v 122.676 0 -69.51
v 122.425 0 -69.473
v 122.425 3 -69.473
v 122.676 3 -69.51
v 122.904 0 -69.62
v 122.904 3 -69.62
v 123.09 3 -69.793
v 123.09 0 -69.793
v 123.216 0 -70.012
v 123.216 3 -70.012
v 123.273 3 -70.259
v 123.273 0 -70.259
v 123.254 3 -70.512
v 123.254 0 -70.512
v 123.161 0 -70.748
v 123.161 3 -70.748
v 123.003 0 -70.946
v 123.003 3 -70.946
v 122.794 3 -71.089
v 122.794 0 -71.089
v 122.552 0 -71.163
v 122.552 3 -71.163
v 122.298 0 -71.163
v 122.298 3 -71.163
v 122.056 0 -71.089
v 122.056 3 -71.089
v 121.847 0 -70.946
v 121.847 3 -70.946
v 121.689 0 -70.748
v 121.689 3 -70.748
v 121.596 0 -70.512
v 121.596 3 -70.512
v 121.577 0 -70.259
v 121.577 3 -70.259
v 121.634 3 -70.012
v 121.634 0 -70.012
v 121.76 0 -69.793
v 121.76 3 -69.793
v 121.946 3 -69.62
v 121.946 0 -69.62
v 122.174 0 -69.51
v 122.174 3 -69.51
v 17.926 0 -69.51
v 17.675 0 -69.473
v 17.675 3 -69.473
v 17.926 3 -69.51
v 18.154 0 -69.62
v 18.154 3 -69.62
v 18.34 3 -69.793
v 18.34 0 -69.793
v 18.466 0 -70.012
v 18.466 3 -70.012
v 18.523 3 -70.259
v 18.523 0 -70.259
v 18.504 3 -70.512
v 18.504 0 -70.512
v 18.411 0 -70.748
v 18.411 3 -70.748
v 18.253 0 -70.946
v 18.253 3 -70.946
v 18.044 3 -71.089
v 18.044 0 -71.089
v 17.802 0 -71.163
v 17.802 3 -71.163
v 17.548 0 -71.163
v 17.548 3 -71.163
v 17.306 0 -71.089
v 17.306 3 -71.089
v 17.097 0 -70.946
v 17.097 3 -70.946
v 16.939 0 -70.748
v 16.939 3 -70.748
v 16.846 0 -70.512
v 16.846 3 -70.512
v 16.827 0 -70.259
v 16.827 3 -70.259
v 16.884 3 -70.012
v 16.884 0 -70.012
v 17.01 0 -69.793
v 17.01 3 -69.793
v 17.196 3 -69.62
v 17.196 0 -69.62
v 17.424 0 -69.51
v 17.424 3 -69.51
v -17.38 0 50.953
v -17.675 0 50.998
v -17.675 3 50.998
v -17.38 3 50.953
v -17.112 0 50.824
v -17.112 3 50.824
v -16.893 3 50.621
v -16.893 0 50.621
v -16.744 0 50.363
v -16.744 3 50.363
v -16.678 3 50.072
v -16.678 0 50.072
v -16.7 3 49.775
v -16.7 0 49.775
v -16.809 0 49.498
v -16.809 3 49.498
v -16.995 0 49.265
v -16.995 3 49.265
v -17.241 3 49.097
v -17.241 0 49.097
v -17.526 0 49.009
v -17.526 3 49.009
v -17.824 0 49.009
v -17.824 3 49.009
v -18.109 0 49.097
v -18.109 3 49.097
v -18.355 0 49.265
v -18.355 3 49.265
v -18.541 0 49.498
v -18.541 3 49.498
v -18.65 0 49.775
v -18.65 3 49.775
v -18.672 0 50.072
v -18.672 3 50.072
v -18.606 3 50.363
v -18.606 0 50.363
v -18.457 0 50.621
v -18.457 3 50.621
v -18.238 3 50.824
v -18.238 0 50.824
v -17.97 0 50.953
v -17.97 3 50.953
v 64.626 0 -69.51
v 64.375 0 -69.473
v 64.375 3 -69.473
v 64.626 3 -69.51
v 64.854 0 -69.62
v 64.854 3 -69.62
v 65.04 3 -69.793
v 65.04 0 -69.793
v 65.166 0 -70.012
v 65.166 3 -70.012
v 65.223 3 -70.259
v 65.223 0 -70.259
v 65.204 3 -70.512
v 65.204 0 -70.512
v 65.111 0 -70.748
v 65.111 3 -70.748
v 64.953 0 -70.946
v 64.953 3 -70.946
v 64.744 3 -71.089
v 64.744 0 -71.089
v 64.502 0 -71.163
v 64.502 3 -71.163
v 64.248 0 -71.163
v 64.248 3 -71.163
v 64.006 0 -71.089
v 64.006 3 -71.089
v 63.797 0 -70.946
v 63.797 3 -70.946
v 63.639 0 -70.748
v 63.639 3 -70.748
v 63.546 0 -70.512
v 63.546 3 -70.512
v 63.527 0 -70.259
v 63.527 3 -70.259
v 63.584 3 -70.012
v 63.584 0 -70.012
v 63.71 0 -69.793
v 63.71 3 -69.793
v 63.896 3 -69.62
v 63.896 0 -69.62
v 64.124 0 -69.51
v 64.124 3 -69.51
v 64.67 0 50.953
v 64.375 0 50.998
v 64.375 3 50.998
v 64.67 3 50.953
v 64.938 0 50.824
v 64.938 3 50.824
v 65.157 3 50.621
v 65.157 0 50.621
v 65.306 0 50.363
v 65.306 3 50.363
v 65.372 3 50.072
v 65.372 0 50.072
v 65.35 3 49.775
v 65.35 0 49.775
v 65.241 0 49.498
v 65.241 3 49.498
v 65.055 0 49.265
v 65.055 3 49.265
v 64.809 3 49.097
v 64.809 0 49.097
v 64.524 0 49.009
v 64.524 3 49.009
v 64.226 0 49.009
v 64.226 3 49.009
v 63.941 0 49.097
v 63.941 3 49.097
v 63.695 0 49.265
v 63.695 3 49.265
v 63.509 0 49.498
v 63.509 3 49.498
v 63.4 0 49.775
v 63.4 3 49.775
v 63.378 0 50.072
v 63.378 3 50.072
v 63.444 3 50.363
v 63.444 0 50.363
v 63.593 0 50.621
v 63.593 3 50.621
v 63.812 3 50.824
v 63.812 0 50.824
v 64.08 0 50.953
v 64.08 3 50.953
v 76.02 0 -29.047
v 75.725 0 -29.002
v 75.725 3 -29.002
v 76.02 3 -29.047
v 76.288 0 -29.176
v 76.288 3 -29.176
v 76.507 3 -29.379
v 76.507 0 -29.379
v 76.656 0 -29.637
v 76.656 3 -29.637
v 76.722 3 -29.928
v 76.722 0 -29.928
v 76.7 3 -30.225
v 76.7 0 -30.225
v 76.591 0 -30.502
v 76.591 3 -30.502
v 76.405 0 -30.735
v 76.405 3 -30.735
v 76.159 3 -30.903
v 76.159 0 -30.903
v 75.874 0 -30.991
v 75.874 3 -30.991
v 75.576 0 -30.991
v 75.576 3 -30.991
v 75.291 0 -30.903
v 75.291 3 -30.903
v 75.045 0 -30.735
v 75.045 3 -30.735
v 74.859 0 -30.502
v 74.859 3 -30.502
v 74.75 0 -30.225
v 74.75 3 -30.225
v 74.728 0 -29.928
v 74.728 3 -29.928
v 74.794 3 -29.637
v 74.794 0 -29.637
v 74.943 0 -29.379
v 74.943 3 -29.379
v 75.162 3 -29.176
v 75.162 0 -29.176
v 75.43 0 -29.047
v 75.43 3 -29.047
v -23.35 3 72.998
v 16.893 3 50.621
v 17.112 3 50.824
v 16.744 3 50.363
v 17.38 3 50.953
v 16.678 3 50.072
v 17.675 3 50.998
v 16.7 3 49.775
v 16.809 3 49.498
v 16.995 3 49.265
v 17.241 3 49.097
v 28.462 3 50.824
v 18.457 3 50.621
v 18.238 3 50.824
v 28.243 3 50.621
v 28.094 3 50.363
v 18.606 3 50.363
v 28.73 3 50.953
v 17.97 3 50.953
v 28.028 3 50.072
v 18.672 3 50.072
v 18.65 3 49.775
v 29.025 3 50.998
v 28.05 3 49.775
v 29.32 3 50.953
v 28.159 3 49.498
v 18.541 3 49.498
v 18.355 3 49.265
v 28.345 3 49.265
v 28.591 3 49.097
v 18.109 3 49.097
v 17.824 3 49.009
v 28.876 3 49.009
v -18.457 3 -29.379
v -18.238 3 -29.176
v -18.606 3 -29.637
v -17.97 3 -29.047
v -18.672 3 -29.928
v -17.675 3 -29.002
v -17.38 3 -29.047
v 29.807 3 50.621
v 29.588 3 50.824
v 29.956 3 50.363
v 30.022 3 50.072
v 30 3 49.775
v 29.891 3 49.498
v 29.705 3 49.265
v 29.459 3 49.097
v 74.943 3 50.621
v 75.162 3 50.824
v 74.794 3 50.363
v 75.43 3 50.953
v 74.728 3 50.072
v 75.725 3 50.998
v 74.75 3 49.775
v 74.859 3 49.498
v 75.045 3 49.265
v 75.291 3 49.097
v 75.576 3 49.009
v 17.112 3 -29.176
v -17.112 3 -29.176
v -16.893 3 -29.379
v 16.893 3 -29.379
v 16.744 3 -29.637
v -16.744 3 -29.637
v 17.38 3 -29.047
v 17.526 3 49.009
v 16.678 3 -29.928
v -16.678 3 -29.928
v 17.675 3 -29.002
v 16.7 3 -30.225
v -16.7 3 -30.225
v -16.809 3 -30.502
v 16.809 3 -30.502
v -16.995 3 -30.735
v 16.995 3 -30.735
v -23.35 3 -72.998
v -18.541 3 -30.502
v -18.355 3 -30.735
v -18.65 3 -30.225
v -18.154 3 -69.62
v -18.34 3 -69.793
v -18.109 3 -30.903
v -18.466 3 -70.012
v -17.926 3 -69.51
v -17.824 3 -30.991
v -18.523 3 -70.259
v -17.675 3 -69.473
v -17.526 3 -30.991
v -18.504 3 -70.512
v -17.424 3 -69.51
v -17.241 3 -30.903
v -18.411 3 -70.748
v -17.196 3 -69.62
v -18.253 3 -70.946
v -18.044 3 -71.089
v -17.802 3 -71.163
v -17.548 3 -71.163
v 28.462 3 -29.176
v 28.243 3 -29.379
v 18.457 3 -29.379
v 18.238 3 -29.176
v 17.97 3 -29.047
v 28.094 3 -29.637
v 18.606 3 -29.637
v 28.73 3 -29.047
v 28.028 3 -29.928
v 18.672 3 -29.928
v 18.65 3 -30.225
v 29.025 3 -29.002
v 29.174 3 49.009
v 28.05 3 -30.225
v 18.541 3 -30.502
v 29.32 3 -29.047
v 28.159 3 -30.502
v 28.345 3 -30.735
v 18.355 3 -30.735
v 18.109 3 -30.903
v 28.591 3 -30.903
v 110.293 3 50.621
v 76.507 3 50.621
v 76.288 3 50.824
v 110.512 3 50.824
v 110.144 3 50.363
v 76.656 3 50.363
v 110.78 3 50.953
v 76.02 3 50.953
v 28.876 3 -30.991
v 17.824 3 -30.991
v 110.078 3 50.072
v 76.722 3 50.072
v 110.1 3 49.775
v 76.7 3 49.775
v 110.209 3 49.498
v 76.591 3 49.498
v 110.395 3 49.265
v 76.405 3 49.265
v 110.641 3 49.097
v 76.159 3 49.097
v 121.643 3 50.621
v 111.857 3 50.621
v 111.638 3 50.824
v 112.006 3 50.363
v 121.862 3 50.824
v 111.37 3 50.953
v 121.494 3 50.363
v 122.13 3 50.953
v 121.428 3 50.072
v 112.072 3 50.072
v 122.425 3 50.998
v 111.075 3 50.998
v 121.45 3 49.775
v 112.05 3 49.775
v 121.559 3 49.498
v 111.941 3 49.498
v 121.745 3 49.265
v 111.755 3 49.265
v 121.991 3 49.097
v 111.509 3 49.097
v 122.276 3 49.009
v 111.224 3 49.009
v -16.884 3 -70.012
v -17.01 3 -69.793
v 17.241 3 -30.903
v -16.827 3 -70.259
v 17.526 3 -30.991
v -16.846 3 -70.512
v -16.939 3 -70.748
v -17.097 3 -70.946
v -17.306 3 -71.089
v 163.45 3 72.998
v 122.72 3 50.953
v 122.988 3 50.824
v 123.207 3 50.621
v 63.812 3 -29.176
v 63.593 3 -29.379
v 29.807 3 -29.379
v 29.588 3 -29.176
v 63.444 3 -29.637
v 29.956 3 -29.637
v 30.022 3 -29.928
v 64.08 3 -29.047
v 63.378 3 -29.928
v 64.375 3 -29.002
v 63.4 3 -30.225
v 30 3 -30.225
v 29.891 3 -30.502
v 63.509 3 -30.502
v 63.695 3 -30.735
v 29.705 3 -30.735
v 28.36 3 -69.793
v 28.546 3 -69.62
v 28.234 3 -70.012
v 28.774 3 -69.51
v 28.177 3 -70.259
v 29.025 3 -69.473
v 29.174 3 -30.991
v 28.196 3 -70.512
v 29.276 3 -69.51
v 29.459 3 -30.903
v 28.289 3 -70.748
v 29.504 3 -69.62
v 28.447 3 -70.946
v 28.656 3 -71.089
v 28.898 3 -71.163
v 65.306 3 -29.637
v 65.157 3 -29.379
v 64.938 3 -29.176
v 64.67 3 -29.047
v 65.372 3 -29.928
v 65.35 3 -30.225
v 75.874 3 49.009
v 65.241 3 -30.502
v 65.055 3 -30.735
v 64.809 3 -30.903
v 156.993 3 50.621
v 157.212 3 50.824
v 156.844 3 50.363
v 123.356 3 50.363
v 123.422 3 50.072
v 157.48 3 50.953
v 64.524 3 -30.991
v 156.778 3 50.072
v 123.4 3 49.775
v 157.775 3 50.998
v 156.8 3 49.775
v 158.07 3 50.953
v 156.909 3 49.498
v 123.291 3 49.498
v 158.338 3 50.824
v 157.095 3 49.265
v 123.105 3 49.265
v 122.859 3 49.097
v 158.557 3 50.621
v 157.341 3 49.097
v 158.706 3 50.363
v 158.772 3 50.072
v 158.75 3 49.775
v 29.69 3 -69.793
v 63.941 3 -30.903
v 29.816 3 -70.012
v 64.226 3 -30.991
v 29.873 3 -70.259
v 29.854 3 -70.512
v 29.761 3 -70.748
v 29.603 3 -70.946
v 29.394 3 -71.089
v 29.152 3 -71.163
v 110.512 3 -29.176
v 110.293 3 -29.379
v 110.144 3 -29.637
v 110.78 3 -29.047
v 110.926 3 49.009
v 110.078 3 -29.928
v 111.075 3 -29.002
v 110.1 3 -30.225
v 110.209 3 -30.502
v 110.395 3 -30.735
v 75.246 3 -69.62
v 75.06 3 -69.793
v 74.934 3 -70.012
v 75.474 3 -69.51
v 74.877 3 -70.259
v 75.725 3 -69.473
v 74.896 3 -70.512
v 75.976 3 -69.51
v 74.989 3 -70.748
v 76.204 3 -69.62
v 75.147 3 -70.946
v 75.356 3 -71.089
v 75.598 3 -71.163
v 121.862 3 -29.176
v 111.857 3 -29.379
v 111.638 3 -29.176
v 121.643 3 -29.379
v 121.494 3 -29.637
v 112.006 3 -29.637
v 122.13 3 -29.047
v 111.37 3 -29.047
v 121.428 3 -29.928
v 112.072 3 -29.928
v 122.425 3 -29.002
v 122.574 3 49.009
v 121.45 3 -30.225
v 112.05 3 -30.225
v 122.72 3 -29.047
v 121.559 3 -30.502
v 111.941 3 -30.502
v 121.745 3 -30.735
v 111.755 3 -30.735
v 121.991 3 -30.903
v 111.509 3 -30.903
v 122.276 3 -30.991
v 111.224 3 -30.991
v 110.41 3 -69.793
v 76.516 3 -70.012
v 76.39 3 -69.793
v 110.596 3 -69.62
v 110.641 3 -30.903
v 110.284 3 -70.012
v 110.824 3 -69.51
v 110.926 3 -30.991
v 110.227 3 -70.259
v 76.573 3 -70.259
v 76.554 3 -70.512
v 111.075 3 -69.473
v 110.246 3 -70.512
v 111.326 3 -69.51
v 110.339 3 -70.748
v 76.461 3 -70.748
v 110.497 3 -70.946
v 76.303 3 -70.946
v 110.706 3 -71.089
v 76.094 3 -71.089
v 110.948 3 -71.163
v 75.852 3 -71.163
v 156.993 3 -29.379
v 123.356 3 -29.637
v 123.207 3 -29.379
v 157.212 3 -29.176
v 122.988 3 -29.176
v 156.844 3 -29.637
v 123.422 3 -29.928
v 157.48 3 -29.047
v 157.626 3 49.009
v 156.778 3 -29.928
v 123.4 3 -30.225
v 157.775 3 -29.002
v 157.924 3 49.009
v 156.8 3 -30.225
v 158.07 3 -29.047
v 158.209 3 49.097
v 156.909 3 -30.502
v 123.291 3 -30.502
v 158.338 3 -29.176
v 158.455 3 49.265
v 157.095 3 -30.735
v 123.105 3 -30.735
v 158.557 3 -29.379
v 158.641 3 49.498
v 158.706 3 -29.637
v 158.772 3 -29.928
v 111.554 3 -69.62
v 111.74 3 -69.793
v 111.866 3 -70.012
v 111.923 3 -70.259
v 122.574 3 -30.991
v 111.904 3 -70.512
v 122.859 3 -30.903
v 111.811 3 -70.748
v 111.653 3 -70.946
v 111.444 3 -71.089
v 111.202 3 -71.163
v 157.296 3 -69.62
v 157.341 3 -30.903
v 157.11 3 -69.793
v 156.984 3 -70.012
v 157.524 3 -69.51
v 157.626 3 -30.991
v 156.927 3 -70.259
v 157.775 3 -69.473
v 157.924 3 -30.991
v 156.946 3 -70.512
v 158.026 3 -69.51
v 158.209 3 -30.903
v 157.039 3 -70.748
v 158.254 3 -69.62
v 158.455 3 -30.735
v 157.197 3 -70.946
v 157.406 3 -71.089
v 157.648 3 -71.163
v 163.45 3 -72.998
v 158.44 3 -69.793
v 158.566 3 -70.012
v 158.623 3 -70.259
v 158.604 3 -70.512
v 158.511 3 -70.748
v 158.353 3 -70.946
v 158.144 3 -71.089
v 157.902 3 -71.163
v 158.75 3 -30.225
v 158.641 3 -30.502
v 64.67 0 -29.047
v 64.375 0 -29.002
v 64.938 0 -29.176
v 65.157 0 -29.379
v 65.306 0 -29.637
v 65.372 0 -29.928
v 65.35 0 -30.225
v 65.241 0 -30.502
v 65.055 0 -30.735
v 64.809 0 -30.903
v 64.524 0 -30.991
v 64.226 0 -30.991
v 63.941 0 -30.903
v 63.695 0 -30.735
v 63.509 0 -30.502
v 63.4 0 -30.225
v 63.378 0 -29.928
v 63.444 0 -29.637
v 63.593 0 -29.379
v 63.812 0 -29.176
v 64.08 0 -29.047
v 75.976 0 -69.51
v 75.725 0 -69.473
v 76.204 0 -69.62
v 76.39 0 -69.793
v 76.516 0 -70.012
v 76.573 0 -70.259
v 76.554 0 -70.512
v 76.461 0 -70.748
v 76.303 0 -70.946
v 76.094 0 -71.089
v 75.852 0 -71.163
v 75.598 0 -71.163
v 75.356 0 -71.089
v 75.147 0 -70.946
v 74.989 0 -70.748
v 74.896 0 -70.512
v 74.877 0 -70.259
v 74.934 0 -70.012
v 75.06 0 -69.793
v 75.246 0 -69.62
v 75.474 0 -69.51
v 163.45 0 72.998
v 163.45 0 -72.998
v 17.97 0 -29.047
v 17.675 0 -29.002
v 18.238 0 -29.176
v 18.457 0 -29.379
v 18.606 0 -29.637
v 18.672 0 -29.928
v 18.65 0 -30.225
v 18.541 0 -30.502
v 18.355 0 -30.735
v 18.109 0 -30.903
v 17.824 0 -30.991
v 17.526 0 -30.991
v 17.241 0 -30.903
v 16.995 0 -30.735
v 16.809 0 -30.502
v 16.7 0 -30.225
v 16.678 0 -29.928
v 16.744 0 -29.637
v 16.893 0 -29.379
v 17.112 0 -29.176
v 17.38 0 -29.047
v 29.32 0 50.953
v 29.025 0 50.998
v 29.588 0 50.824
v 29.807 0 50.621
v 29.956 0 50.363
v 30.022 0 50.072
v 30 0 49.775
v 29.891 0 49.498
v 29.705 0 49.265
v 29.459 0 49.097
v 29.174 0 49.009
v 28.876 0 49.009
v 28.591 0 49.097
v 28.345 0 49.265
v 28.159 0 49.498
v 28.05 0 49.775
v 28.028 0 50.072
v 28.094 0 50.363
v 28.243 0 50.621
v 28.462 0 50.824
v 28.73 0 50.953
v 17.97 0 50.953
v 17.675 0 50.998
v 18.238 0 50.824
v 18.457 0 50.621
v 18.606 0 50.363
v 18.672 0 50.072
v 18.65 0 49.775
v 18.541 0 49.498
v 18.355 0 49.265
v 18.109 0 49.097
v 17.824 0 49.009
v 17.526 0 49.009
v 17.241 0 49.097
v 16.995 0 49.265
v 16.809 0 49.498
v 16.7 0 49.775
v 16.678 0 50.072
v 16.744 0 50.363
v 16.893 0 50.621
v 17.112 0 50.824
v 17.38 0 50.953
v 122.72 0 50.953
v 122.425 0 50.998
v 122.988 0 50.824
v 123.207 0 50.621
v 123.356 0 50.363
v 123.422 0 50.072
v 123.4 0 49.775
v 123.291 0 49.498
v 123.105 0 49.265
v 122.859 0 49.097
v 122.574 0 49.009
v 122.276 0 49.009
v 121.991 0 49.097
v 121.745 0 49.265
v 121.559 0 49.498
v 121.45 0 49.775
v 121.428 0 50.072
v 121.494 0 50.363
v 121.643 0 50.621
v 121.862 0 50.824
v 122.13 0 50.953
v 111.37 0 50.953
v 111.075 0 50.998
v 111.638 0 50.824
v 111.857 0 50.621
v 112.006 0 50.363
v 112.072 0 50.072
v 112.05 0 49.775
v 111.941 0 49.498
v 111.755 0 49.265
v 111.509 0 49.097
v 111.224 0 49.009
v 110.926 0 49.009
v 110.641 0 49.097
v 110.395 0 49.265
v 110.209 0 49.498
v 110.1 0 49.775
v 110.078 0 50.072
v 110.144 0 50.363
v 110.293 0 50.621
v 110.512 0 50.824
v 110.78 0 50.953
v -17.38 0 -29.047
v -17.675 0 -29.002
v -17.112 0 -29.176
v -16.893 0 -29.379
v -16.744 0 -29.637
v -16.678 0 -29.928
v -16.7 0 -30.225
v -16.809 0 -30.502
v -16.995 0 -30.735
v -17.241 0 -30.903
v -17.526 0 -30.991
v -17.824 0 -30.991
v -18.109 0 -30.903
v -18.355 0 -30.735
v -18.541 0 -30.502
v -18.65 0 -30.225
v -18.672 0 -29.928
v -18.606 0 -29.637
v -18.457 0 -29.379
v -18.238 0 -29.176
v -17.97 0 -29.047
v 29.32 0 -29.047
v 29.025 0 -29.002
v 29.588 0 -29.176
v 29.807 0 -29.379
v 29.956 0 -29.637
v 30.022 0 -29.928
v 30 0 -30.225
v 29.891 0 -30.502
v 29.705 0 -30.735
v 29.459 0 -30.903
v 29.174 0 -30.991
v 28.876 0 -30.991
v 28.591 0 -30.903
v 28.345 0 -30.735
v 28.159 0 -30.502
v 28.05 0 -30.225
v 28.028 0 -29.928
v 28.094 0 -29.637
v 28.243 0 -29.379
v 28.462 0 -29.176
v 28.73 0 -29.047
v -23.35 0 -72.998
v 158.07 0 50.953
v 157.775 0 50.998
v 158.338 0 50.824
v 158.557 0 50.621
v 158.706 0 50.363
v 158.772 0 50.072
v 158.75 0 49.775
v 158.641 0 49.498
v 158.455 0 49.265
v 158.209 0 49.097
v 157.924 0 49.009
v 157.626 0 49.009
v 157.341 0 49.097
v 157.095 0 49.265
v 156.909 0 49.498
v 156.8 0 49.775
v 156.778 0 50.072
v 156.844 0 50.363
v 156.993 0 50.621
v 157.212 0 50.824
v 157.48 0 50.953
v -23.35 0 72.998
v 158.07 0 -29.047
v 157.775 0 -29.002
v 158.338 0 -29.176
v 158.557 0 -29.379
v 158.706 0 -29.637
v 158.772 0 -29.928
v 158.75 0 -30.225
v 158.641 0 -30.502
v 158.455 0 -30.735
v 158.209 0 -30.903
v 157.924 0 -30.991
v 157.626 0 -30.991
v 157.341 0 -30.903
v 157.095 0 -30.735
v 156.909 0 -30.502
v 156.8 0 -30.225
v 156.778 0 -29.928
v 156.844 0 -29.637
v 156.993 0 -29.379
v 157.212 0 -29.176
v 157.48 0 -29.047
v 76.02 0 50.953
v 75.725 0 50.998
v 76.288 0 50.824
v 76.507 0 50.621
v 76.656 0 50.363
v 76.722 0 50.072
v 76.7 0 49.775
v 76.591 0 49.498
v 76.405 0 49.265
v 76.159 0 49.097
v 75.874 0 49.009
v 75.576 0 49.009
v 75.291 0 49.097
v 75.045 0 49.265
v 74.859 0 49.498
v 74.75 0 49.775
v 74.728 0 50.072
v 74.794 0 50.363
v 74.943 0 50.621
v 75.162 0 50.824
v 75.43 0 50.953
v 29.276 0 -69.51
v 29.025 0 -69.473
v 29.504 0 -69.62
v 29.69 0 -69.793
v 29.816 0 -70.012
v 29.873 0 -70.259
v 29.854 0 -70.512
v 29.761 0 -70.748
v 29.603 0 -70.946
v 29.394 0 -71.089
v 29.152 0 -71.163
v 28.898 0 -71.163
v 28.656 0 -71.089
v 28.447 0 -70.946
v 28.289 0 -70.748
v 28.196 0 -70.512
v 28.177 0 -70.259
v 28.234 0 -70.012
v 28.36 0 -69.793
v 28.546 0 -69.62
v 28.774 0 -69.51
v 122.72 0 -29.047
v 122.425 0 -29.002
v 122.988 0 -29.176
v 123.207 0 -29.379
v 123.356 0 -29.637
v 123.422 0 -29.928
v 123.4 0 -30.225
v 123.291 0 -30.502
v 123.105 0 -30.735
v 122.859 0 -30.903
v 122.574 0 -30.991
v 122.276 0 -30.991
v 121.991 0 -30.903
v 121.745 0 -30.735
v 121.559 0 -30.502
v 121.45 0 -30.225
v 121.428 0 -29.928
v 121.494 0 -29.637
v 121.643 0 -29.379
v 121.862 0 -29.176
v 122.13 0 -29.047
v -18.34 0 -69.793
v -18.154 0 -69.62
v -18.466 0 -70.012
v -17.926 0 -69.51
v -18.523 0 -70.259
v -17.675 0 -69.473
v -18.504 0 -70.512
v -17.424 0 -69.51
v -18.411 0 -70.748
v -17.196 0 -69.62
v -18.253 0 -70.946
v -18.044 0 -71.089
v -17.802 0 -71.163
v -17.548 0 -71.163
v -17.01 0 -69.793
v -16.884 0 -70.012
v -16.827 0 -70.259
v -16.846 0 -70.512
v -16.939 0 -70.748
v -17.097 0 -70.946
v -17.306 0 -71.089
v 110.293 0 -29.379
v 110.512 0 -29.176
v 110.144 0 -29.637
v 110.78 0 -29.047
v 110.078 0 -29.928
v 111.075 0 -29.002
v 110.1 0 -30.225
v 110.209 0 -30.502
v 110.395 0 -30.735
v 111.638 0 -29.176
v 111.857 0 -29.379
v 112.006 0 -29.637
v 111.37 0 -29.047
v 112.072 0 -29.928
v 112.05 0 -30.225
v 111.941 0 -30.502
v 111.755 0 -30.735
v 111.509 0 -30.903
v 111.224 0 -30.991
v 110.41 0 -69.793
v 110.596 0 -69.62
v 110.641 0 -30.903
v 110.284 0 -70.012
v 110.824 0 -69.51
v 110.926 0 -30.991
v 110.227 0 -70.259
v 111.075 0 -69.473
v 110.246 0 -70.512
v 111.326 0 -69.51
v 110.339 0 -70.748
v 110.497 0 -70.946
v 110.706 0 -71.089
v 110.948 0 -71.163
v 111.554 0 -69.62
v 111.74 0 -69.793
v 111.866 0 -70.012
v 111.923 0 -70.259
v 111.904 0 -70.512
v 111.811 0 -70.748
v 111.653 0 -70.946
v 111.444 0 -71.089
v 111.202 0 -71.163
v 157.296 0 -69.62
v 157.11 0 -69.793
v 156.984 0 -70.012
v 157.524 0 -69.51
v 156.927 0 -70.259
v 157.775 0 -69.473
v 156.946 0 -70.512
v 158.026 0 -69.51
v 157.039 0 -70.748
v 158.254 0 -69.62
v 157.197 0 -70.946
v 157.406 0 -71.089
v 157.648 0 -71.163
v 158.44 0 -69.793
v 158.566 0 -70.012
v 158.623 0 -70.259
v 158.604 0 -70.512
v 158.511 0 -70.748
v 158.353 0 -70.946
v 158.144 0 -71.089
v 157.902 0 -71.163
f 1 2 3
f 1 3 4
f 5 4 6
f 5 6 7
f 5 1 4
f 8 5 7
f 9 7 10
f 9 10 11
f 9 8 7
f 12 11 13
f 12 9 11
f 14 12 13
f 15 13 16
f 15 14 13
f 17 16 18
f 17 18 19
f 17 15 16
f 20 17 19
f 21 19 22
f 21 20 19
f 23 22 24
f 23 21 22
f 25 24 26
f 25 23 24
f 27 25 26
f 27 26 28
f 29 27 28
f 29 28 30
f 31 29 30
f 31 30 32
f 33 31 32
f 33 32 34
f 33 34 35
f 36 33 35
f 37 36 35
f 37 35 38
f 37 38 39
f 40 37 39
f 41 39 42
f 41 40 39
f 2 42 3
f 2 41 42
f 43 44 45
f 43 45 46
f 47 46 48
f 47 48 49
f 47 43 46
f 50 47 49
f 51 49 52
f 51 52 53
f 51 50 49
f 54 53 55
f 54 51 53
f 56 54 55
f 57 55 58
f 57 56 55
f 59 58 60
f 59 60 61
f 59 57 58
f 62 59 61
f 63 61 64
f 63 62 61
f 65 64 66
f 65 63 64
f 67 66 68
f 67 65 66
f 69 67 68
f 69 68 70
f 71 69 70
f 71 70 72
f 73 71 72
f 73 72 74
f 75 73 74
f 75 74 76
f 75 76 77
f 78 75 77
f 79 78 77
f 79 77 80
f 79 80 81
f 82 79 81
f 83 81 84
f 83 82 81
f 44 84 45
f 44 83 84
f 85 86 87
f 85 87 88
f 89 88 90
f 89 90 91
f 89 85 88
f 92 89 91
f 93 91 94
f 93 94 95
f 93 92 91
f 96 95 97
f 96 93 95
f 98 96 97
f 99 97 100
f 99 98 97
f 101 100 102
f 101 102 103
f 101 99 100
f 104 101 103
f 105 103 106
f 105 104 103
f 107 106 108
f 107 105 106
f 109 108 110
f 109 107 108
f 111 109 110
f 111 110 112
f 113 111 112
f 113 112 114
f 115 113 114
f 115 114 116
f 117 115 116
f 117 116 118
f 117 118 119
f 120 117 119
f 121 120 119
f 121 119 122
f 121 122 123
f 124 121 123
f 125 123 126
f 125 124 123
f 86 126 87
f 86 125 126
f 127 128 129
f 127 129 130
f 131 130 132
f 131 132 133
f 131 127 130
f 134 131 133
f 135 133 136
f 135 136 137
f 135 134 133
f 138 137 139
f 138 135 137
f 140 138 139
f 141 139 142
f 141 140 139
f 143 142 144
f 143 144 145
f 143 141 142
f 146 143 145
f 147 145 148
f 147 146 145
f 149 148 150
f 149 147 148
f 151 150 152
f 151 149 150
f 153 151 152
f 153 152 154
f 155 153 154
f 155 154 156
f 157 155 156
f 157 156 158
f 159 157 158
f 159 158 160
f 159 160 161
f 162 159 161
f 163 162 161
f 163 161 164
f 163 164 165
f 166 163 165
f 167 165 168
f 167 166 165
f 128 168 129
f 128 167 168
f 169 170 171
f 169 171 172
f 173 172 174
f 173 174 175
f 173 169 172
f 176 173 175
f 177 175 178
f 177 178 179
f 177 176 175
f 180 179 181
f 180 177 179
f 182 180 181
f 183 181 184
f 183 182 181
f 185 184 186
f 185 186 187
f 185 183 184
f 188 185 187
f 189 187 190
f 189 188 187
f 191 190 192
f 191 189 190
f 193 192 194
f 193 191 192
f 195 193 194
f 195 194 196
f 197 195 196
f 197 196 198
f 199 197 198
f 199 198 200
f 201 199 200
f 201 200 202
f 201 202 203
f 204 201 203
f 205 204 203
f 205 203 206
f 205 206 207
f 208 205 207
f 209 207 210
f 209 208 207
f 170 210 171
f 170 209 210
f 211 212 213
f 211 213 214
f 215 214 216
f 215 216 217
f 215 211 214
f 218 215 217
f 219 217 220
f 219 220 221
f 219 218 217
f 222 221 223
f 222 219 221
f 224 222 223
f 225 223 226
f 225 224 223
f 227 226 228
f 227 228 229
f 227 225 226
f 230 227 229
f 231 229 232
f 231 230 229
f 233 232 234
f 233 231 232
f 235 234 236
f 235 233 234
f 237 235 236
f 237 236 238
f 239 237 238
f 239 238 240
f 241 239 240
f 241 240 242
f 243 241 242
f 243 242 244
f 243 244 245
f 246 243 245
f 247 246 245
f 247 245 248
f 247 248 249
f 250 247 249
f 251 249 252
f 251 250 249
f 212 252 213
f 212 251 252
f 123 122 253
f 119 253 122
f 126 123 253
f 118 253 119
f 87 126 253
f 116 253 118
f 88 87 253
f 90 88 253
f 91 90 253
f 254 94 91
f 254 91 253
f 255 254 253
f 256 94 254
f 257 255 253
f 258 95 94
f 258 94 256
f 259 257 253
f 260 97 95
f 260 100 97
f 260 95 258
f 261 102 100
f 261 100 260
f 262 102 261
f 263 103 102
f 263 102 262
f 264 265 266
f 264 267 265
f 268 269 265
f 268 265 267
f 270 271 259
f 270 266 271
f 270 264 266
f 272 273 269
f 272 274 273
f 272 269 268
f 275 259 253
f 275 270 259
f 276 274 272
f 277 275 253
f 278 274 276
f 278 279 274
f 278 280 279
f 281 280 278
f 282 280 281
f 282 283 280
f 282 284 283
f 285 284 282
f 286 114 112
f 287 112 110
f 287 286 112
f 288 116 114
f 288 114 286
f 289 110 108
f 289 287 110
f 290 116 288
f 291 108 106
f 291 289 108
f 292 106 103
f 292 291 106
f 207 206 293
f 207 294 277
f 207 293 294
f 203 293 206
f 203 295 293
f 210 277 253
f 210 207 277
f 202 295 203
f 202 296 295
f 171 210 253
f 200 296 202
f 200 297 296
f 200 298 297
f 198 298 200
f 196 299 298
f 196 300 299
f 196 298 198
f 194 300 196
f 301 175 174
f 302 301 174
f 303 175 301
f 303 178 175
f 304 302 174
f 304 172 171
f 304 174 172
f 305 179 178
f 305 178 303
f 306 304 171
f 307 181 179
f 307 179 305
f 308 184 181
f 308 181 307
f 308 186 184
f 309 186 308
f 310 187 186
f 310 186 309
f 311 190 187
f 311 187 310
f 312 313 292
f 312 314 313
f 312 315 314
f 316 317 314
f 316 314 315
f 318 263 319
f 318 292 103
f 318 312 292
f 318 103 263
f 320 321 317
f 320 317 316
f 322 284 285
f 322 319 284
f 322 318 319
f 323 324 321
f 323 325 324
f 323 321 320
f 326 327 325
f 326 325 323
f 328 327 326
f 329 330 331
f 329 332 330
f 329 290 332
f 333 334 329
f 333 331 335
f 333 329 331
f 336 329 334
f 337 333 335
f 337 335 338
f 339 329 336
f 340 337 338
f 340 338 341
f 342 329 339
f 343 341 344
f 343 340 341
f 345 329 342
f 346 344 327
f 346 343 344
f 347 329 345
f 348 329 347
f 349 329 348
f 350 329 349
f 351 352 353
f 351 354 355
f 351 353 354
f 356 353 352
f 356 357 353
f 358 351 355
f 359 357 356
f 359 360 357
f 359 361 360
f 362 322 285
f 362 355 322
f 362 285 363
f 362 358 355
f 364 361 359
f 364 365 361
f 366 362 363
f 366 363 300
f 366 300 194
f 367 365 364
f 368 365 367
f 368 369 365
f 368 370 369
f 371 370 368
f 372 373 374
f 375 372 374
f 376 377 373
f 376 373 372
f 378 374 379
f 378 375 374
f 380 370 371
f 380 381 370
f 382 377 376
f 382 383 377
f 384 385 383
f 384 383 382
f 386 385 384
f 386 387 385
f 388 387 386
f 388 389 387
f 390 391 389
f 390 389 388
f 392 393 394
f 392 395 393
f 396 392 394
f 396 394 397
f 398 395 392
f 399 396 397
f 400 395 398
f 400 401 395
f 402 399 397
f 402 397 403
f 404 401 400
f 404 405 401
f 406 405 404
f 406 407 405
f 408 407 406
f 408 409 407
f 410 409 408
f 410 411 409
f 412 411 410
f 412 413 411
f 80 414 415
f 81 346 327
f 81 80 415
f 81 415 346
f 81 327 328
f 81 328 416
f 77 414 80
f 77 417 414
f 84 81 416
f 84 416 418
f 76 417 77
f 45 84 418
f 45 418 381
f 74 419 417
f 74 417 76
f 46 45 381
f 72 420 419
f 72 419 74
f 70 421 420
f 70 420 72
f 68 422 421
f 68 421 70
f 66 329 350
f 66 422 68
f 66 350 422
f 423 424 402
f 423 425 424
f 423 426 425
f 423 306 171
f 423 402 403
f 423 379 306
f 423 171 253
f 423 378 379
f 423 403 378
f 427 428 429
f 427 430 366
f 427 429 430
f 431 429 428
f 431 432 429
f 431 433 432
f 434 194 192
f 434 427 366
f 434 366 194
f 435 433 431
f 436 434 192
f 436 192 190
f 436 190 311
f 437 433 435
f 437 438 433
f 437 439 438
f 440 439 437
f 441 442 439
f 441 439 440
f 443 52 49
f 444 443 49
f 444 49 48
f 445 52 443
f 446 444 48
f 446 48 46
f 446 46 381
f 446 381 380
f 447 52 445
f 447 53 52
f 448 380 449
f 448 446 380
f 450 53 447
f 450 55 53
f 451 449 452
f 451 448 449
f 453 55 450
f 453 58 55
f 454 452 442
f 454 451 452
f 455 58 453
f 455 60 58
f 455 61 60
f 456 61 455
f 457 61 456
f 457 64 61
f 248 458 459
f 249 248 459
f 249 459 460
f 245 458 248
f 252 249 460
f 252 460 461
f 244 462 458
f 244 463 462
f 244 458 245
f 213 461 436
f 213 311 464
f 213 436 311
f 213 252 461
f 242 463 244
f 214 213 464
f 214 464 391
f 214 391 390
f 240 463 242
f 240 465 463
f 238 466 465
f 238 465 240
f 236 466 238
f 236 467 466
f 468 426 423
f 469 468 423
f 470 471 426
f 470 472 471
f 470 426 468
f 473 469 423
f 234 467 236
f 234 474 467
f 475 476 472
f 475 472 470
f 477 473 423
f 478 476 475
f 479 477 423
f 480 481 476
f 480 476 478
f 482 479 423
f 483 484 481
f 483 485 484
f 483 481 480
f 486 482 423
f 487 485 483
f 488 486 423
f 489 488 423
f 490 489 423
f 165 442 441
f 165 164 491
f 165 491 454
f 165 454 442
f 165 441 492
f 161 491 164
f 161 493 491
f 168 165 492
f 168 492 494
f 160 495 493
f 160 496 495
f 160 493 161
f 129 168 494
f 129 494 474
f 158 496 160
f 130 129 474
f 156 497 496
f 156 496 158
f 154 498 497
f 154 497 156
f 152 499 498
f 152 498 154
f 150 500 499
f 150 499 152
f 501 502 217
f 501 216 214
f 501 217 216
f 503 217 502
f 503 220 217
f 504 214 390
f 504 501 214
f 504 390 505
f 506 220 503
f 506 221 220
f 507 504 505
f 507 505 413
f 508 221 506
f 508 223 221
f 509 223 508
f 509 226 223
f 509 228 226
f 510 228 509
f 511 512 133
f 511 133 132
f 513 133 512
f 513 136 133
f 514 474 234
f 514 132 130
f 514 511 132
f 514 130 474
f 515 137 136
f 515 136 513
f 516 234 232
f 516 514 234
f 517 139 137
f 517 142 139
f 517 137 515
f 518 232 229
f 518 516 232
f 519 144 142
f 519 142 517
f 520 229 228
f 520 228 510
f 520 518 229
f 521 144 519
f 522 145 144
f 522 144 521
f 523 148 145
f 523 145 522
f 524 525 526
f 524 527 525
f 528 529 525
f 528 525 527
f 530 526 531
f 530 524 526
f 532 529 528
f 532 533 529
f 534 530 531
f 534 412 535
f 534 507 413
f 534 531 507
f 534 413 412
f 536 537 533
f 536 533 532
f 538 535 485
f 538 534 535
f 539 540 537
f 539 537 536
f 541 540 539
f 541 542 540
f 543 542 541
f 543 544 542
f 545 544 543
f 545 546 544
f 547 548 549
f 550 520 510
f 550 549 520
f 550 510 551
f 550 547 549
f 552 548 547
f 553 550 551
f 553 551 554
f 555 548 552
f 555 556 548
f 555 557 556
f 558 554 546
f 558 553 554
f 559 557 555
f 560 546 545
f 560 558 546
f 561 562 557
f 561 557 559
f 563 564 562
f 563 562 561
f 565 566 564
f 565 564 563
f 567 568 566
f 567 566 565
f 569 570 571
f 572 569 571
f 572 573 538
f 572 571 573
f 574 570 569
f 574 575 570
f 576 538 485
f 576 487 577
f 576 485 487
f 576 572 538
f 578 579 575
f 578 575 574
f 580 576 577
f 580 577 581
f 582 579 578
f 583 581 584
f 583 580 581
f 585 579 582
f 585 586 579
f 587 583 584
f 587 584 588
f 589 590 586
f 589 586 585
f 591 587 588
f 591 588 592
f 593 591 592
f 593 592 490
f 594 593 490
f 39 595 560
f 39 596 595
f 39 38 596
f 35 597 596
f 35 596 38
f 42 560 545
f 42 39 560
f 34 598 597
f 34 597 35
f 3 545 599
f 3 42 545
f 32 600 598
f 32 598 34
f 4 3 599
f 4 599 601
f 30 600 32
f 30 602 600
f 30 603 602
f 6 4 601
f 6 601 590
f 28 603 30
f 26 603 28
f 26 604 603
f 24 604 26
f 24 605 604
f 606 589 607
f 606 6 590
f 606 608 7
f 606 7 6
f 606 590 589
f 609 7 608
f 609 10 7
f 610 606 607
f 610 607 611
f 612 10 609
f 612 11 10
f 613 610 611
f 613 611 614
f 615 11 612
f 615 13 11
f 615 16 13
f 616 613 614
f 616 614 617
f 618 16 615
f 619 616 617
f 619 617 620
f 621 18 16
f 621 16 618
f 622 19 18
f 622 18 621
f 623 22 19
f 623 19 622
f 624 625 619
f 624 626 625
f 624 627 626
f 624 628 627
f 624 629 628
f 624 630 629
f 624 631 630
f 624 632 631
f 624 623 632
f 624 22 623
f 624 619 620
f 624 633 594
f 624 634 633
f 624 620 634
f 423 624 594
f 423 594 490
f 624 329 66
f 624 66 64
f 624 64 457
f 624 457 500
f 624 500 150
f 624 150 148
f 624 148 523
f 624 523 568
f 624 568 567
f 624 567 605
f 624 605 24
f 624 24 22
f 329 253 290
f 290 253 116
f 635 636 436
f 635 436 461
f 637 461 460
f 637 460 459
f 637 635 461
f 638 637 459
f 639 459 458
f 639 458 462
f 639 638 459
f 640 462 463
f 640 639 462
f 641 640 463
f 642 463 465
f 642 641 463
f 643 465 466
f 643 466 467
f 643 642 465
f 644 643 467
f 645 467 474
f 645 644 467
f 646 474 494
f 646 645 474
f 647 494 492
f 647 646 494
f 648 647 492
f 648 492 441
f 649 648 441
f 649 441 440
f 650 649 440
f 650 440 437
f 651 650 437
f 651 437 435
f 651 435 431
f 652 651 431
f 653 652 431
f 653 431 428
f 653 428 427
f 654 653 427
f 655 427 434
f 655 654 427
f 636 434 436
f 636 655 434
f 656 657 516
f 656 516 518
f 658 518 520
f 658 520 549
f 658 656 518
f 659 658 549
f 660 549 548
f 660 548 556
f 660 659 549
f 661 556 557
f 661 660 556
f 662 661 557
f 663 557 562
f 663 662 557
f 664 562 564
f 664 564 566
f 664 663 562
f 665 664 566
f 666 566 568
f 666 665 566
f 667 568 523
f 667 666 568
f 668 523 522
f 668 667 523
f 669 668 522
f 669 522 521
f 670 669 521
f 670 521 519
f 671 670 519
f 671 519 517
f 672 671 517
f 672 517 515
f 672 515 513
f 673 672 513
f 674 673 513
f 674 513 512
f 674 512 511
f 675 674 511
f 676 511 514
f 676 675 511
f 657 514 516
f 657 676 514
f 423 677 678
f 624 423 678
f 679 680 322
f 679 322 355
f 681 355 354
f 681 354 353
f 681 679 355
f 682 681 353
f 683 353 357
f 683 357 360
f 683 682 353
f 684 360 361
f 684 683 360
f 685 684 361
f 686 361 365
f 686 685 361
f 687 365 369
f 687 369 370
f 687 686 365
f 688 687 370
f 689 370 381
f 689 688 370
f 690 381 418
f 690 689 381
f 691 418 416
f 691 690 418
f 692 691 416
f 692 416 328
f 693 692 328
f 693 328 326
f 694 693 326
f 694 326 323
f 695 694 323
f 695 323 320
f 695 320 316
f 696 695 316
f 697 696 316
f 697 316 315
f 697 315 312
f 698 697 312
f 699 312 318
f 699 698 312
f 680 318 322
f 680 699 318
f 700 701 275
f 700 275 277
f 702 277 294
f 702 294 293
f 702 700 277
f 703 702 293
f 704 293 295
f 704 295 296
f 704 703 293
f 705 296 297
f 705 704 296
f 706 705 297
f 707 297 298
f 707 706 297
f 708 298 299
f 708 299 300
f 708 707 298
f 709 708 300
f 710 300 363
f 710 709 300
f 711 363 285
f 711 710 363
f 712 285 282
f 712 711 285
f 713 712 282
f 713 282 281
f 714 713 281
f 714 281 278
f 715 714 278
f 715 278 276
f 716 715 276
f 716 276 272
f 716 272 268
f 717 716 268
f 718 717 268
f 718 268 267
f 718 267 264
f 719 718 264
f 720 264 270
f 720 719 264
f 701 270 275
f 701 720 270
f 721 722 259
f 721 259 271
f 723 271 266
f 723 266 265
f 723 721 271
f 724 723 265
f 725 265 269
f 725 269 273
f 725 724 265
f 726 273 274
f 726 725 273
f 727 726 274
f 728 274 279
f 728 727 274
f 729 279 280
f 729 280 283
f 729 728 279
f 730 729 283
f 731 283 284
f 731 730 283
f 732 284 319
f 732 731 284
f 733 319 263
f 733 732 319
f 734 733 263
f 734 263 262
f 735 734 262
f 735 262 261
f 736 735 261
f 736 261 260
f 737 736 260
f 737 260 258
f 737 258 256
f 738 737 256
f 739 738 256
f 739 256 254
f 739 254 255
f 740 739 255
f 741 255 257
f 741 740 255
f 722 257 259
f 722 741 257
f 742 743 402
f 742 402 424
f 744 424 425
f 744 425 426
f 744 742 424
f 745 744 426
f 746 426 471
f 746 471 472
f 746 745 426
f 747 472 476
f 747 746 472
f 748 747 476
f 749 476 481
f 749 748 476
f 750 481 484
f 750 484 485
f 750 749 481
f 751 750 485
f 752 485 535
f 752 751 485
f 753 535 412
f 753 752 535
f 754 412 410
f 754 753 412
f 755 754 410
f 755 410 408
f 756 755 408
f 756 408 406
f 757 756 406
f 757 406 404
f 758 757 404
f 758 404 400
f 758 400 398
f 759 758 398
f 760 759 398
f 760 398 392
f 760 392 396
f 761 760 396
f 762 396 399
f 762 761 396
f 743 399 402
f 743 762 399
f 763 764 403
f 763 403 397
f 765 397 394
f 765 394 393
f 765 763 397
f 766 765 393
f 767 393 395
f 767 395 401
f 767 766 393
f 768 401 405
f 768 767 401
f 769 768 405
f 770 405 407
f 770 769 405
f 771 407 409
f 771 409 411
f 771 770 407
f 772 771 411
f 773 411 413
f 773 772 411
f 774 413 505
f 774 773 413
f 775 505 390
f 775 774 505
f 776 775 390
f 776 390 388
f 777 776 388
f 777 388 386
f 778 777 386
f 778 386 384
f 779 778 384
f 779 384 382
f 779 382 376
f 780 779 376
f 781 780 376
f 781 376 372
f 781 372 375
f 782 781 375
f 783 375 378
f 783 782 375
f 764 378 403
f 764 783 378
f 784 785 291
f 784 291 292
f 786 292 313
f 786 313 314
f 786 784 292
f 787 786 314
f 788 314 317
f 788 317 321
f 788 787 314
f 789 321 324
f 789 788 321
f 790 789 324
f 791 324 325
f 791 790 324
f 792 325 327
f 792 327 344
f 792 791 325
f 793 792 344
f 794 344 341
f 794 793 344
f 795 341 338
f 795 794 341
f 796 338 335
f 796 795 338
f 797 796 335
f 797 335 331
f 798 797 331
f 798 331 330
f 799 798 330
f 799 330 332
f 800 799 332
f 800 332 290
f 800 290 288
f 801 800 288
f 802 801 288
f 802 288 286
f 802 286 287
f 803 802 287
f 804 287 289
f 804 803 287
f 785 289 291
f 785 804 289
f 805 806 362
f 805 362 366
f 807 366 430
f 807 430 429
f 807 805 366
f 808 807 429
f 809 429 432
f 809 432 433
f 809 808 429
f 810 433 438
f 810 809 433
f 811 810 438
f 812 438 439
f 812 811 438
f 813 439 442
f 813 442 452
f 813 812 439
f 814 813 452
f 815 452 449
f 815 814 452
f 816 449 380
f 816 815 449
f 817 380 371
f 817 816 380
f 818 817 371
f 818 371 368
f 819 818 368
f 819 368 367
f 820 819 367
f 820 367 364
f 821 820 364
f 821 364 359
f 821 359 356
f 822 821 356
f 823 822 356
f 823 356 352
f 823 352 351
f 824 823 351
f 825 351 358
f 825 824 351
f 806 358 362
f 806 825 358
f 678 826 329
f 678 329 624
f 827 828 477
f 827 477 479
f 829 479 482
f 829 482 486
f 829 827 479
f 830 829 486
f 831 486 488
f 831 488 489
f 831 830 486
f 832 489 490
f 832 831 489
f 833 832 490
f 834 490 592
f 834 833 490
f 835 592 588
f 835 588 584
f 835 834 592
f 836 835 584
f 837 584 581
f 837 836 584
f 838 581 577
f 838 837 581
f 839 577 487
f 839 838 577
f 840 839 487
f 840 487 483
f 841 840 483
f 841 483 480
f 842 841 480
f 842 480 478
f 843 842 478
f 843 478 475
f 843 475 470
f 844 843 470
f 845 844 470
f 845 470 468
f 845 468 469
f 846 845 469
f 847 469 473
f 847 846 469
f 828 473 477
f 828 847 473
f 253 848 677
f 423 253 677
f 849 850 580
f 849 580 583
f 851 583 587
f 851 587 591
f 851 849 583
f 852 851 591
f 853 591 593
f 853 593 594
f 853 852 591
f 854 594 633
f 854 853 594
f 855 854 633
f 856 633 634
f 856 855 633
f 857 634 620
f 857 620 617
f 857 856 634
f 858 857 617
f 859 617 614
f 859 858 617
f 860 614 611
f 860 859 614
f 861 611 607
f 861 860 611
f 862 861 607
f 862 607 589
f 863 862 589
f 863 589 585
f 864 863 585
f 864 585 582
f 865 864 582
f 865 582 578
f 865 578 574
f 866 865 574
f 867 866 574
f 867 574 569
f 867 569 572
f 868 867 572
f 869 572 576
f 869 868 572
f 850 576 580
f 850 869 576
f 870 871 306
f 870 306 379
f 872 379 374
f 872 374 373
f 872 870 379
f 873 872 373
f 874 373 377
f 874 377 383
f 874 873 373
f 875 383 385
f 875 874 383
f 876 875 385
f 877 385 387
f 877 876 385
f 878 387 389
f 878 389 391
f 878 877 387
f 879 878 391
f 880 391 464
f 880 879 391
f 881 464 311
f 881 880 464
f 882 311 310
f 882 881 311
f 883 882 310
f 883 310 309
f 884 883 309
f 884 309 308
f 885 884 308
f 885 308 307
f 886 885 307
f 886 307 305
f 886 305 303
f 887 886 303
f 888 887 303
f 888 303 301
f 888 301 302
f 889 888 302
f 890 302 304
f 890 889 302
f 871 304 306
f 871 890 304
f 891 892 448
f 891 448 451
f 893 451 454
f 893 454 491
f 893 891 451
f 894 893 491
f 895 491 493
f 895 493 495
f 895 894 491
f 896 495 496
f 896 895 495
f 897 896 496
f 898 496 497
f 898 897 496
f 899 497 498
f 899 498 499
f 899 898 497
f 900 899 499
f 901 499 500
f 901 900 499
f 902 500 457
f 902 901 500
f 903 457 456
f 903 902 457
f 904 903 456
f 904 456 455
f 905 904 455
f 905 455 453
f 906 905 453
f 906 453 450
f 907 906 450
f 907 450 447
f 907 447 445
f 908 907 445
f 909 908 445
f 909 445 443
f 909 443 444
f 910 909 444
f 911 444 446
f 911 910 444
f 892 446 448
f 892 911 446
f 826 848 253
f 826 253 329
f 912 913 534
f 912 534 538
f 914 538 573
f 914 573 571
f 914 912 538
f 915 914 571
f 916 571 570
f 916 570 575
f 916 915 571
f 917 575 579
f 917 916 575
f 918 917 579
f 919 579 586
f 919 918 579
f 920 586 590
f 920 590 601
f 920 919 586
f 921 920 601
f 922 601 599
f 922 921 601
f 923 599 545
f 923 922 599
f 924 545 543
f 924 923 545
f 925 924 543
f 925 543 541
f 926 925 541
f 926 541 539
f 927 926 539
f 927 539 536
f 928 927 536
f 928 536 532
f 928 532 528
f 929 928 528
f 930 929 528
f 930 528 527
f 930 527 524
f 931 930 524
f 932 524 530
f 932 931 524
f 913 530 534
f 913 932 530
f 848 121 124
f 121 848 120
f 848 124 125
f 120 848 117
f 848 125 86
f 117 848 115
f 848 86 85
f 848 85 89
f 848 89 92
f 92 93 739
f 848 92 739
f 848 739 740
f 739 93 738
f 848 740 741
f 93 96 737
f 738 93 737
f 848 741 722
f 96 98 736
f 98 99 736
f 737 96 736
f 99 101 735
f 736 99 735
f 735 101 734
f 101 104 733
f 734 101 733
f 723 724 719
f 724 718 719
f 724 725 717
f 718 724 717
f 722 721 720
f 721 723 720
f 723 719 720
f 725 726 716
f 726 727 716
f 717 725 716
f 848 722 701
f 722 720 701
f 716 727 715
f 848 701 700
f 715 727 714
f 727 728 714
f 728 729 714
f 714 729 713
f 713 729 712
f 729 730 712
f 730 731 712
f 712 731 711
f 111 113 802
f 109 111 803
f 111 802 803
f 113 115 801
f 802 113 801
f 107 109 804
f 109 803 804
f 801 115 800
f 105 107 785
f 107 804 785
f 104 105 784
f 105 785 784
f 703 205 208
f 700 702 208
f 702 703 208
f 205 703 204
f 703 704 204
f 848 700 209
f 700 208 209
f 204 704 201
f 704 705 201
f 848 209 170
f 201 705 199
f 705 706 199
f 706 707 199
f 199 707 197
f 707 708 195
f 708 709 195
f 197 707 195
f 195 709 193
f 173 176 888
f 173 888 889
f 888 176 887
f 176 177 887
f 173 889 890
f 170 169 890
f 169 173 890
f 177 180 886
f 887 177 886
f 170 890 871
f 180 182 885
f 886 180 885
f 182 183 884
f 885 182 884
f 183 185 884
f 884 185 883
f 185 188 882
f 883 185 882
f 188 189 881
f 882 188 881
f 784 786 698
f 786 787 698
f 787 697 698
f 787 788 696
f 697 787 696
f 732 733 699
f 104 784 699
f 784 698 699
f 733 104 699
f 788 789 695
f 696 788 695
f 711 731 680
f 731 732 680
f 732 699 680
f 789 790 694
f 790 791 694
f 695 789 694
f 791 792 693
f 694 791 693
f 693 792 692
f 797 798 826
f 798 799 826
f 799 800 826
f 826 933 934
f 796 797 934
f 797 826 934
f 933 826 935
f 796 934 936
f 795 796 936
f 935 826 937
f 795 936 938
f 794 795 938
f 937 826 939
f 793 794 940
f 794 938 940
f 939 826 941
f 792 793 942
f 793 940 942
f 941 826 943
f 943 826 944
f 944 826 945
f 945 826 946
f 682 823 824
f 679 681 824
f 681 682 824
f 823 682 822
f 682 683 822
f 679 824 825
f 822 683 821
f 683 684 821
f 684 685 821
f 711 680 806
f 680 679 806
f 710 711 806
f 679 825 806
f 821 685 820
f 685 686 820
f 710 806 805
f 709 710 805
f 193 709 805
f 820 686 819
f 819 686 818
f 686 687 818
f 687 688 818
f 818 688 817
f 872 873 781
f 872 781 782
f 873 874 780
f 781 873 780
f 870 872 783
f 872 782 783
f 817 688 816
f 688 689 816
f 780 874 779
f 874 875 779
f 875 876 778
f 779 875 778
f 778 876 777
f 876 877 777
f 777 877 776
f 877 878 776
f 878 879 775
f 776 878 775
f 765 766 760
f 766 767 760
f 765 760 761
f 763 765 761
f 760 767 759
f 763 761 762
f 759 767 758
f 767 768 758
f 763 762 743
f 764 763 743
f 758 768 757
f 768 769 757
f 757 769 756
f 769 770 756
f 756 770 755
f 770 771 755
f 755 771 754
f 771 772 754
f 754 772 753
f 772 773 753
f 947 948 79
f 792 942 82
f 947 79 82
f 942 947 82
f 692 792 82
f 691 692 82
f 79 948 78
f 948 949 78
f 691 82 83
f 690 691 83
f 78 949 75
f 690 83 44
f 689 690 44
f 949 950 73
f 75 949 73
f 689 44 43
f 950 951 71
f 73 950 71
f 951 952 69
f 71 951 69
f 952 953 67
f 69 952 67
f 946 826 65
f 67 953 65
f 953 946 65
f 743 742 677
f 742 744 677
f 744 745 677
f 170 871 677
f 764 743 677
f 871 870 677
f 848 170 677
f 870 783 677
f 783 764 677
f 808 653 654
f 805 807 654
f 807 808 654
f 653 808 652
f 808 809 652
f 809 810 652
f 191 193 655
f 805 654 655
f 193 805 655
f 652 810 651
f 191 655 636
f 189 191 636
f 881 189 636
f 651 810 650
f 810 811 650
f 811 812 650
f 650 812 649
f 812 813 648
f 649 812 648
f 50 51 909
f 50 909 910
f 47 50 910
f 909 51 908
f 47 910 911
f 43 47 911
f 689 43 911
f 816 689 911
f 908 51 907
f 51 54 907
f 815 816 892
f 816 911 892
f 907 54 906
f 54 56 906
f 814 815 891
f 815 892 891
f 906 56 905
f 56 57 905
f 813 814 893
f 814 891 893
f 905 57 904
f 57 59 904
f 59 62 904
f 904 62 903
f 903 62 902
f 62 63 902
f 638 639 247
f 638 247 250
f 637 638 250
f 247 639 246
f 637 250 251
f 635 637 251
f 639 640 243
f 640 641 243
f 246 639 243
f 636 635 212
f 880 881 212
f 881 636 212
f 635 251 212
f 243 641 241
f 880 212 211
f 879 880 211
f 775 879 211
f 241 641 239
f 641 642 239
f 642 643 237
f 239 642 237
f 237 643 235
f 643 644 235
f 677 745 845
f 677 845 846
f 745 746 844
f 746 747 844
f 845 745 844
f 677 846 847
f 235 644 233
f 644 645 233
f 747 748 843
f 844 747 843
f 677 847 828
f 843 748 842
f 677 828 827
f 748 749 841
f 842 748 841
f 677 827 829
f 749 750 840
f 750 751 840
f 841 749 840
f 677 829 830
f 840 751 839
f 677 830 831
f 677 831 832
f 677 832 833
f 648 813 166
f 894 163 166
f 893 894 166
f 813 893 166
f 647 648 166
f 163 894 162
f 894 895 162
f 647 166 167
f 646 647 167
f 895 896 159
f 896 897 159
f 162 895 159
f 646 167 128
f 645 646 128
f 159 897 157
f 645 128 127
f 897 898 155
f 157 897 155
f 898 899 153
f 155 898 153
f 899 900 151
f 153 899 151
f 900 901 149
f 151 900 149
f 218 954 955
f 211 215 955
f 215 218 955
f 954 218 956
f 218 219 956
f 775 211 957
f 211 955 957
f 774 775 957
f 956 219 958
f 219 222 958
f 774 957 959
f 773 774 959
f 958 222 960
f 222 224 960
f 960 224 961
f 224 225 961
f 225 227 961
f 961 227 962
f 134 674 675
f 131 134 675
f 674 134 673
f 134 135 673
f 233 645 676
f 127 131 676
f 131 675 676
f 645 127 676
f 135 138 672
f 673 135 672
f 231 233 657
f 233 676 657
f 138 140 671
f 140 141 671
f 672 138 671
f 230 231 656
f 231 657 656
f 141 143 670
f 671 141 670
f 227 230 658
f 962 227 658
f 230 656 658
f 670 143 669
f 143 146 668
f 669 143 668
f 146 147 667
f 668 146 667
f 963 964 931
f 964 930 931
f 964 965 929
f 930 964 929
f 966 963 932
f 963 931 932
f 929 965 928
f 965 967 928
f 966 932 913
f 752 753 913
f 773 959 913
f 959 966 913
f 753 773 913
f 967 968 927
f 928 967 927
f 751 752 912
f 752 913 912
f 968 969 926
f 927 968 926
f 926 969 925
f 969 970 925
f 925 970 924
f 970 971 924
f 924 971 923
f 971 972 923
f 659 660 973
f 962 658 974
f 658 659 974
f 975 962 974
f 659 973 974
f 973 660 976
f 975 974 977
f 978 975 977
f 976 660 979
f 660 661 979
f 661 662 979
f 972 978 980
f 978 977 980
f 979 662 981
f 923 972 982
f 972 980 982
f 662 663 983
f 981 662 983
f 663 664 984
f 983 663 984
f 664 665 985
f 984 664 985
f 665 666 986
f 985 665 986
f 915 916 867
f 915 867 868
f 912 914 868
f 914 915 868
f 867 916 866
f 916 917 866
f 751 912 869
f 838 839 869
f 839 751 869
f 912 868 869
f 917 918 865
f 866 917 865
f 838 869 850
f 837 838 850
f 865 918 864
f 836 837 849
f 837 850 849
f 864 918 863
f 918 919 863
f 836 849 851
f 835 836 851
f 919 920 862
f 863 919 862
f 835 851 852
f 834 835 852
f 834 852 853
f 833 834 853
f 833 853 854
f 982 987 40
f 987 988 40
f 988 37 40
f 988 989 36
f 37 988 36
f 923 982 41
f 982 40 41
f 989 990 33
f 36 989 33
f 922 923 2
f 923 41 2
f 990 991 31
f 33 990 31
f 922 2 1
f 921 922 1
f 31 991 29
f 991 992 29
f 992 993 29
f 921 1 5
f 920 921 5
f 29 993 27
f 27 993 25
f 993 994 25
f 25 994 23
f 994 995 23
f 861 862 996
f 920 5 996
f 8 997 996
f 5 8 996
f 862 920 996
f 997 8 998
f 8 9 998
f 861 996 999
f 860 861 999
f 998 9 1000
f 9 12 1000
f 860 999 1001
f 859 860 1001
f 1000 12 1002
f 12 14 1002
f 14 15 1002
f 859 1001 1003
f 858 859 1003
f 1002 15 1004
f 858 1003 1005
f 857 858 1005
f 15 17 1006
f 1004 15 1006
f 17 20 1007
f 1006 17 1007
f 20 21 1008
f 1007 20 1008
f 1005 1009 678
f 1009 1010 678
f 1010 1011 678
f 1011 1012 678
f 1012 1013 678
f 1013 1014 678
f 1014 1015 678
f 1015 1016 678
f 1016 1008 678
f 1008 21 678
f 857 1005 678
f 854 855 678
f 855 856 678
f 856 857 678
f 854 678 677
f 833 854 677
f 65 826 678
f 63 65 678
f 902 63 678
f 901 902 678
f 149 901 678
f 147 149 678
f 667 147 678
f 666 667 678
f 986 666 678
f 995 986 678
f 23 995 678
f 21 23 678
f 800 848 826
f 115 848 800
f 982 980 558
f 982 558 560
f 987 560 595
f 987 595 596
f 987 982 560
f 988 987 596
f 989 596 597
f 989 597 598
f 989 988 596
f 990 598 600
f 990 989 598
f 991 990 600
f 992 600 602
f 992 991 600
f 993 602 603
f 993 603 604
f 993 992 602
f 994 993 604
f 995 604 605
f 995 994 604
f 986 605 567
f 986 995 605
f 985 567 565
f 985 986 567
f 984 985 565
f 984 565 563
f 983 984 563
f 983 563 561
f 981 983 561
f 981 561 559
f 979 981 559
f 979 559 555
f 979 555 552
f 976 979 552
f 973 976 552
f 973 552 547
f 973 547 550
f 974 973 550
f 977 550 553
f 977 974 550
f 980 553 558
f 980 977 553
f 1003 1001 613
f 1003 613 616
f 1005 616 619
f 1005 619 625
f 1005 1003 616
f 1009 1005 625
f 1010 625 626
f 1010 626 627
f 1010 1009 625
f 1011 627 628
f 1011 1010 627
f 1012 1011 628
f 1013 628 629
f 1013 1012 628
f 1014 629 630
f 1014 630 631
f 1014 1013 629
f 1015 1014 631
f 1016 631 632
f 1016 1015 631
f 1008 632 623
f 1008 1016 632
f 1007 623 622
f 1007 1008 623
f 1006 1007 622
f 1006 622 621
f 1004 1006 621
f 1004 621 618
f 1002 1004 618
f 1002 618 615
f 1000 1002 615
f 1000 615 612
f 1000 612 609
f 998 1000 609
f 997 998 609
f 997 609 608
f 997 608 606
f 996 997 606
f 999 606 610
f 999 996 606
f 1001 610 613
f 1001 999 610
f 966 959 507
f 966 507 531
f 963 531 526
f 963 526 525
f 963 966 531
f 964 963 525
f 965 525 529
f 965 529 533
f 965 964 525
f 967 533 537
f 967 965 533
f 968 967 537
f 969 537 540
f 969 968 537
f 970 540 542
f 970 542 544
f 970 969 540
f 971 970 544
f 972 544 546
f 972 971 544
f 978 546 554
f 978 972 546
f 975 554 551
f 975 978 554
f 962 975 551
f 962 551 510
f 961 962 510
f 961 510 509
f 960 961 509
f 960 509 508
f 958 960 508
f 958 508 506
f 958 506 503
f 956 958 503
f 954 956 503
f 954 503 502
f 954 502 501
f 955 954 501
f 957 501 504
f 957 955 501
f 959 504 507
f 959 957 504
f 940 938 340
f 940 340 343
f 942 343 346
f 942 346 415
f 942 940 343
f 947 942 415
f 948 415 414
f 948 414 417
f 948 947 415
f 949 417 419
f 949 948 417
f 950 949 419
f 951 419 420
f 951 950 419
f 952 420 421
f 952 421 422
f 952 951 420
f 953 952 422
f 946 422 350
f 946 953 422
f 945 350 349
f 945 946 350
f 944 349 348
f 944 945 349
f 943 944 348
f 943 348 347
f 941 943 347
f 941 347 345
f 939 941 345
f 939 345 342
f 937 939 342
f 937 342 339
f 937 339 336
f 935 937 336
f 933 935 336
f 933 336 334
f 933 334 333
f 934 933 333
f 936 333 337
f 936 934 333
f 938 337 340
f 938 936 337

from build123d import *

# Parameters (mm, degrees)
SKETCH1_W           = 46.7
SKETCH1_H           = 145.995384974
SKETCH1_R           = 1
SKETCH1_R_2         = 0.85
BOSS_EXTRUDE1_DEPTH = 3


with BuildPart() as part:
    # Sketch1 → Boss-Extrude1 (new body)
    # profile 1 of 4: a face of its own
    with BuildSketch(Plane(origin=(0, 0, 0), x_dir=(1, 0, 0), z_dir=(0, 1, 0))):
        Rectangle(SKETCH1_W, SKETCH1_H)
        with Locations(Location((-17.675, -49.997692487, 0), (0, 0, 270))):
            Circle(SKETCH1_R, mode=Mode.SUBTRACT)
        with Locations(Location((17.675, -49.997692487, 0), (0, 0, 270))):
            Circle(SKETCH1_R, mode=Mode.SUBTRACT)
        with Locations(Location((-17.675, 30.002307513, 0), (0, 0, 270))):
            Circle(SKETCH1_R, mode=Mode.SUBTRACT)
        with Locations(Location((17.675, 30.002307513, 0), (0, 0, 270))):
            Circle(SKETCH1_R, mode=Mode.SUBTRACT)
        with Locations(Location((-17.675, 70.322692487, 0), (0, 0, 270))):
            Circle(SKETCH1_R_2, mode=Mode.SUBTRACT)
        with Locations(Location((17.675, 70.322692487, 0), (0, 0, 270))):
            Circle(SKETCH1_R_2, mode=Mode.SUBTRACT)
    # profile 2 of 4: a face of its own
    with BuildSketch(Plane(origin=(0, 0, 0), x_dir=(1, 0, 0), z_dir=(0, 1, 0))):
        with Locations((46.7, 0)):
            Rectangle(SKETCH1_W, SKETCH1_H)
        with Locations(Location((29.025, -49.997692487, 0), (0, 0, 270))):
            Circle(SKETCH1_R, mode=Mode.SUBTRACT)
        with Locations(Location((64.375, -49.997692487, 0), (0, 0, 270))):
            Circle(SKETCH1_R, mode=Mode.SUBTRACT)
        with Locations(Location((29.025, 30.002307513, 0), (0, 0, 270))):
            Circle(SKETCH1_R, mode=Mode.SUBTRACT)
        with Locations(Location((64.375, 30.002307513, 0), (0, 0, 270))):
            Circle(SKETCH1_R, mode=Mode.SUBTRACT)
        with Locations(Location((29.025, 70.322692487, 0), (0, 0, 270))):
            Circle(SKETCH1_R_2, mode=Mode.SUBTRACT)
        with Locations(Location((64.375, 70.322692487, 0), (0, 0, 270))):
            Circle(SKETCH1_R_2, mode=Mode.SUBTRACT)
    # profile 3 of 4: a face of its own
    with BuildSketch(Plane(origin=(0, 0, 0), x_dir=(1, 0, 0), z_dir=(0, 1, 0))):
        with Locations((93.4, 0)):
            Rectangle(SKETCH1_W, SKETCH1_H)
        with Locations(Location((75.725, -49.997692487, 0), (0, 0, 270))):
            Circle(SKETCH1_R, mode=Mode.SUBTRACT)
        with Locations(Location((111.075, -49.997692487, 0), (0, 0, 270))):
            Circle(SKETCH1_R, mode=Mode.SUBTRACT)
        with Locations(Location((75.725, 30.002307513, 0), (0, 0, 270))):
            Circle(SKETCH1_R, mode=Mode.SUBTRACT)
        with Locations(Location((111.075, 30.002307513, 0), (0, 0, 270))):
            Circle(SKETCH1_R, mode=Mode.SUBTRACT)
        with Locations(Location((75.725, 70.322692487, 0), (0, 0, 270))):
            Circle(SKETCH1_R_2, mode=Mode.SUBTRACT)
        with Locations(Location((111.075, 70.322692487, 0), (0, 0, 270))):
            Circle(SKETCH1_R_2, mode=Mode.SUBTRACT)
    # profile 4 of 4: a face of its own
    with BuildSketch(Plane(origin=(0, 0, 0), x_dir=(1, 0, 0), z_dir=(0, 1, 0))):
        with Locations((140.1, 0)):
            Rectangle(SKETCH1_W, SKETCH1_H)
        with Locations(Location((122.425, -49.997692487, 0), (0, 0, 270))):
            Circle(SKETCH1_R, mode=Mode.SUBTRACT)
        with Locations(Location((157.775, -49.997692487, 0), (0, 0, 270))):
            Circle(SKETCH1_R, mode=Mode.SUBTRACT)
        with Locations(Location((122.425, 30.002307513, 0), (0, 0, 270))):
            Circle(SKETCH1_R, mode=Mode.SUBTRACT)
        with Locations(Location((157.775, 30.002307513, 0), (0, 0, 270))):
            Circle(SKETCH1_R, mode=Mode.SUBTRACT)
        with Locations(Location((122.425, 70.322692487, 0), (0, 0, 270))):
            Circle(SKETCH1_R_2, mode=Mode.SUBTRACT)
        with Locations(Location((157.775, 70.322692487, 0), (0, 0, 270))):
            Circle(SKETCH1_R_2, mode=Mode.SUBTRACT)
    extrude(amount=BOSS_EXTRUDE1_DEPTH)


solid = part.part
